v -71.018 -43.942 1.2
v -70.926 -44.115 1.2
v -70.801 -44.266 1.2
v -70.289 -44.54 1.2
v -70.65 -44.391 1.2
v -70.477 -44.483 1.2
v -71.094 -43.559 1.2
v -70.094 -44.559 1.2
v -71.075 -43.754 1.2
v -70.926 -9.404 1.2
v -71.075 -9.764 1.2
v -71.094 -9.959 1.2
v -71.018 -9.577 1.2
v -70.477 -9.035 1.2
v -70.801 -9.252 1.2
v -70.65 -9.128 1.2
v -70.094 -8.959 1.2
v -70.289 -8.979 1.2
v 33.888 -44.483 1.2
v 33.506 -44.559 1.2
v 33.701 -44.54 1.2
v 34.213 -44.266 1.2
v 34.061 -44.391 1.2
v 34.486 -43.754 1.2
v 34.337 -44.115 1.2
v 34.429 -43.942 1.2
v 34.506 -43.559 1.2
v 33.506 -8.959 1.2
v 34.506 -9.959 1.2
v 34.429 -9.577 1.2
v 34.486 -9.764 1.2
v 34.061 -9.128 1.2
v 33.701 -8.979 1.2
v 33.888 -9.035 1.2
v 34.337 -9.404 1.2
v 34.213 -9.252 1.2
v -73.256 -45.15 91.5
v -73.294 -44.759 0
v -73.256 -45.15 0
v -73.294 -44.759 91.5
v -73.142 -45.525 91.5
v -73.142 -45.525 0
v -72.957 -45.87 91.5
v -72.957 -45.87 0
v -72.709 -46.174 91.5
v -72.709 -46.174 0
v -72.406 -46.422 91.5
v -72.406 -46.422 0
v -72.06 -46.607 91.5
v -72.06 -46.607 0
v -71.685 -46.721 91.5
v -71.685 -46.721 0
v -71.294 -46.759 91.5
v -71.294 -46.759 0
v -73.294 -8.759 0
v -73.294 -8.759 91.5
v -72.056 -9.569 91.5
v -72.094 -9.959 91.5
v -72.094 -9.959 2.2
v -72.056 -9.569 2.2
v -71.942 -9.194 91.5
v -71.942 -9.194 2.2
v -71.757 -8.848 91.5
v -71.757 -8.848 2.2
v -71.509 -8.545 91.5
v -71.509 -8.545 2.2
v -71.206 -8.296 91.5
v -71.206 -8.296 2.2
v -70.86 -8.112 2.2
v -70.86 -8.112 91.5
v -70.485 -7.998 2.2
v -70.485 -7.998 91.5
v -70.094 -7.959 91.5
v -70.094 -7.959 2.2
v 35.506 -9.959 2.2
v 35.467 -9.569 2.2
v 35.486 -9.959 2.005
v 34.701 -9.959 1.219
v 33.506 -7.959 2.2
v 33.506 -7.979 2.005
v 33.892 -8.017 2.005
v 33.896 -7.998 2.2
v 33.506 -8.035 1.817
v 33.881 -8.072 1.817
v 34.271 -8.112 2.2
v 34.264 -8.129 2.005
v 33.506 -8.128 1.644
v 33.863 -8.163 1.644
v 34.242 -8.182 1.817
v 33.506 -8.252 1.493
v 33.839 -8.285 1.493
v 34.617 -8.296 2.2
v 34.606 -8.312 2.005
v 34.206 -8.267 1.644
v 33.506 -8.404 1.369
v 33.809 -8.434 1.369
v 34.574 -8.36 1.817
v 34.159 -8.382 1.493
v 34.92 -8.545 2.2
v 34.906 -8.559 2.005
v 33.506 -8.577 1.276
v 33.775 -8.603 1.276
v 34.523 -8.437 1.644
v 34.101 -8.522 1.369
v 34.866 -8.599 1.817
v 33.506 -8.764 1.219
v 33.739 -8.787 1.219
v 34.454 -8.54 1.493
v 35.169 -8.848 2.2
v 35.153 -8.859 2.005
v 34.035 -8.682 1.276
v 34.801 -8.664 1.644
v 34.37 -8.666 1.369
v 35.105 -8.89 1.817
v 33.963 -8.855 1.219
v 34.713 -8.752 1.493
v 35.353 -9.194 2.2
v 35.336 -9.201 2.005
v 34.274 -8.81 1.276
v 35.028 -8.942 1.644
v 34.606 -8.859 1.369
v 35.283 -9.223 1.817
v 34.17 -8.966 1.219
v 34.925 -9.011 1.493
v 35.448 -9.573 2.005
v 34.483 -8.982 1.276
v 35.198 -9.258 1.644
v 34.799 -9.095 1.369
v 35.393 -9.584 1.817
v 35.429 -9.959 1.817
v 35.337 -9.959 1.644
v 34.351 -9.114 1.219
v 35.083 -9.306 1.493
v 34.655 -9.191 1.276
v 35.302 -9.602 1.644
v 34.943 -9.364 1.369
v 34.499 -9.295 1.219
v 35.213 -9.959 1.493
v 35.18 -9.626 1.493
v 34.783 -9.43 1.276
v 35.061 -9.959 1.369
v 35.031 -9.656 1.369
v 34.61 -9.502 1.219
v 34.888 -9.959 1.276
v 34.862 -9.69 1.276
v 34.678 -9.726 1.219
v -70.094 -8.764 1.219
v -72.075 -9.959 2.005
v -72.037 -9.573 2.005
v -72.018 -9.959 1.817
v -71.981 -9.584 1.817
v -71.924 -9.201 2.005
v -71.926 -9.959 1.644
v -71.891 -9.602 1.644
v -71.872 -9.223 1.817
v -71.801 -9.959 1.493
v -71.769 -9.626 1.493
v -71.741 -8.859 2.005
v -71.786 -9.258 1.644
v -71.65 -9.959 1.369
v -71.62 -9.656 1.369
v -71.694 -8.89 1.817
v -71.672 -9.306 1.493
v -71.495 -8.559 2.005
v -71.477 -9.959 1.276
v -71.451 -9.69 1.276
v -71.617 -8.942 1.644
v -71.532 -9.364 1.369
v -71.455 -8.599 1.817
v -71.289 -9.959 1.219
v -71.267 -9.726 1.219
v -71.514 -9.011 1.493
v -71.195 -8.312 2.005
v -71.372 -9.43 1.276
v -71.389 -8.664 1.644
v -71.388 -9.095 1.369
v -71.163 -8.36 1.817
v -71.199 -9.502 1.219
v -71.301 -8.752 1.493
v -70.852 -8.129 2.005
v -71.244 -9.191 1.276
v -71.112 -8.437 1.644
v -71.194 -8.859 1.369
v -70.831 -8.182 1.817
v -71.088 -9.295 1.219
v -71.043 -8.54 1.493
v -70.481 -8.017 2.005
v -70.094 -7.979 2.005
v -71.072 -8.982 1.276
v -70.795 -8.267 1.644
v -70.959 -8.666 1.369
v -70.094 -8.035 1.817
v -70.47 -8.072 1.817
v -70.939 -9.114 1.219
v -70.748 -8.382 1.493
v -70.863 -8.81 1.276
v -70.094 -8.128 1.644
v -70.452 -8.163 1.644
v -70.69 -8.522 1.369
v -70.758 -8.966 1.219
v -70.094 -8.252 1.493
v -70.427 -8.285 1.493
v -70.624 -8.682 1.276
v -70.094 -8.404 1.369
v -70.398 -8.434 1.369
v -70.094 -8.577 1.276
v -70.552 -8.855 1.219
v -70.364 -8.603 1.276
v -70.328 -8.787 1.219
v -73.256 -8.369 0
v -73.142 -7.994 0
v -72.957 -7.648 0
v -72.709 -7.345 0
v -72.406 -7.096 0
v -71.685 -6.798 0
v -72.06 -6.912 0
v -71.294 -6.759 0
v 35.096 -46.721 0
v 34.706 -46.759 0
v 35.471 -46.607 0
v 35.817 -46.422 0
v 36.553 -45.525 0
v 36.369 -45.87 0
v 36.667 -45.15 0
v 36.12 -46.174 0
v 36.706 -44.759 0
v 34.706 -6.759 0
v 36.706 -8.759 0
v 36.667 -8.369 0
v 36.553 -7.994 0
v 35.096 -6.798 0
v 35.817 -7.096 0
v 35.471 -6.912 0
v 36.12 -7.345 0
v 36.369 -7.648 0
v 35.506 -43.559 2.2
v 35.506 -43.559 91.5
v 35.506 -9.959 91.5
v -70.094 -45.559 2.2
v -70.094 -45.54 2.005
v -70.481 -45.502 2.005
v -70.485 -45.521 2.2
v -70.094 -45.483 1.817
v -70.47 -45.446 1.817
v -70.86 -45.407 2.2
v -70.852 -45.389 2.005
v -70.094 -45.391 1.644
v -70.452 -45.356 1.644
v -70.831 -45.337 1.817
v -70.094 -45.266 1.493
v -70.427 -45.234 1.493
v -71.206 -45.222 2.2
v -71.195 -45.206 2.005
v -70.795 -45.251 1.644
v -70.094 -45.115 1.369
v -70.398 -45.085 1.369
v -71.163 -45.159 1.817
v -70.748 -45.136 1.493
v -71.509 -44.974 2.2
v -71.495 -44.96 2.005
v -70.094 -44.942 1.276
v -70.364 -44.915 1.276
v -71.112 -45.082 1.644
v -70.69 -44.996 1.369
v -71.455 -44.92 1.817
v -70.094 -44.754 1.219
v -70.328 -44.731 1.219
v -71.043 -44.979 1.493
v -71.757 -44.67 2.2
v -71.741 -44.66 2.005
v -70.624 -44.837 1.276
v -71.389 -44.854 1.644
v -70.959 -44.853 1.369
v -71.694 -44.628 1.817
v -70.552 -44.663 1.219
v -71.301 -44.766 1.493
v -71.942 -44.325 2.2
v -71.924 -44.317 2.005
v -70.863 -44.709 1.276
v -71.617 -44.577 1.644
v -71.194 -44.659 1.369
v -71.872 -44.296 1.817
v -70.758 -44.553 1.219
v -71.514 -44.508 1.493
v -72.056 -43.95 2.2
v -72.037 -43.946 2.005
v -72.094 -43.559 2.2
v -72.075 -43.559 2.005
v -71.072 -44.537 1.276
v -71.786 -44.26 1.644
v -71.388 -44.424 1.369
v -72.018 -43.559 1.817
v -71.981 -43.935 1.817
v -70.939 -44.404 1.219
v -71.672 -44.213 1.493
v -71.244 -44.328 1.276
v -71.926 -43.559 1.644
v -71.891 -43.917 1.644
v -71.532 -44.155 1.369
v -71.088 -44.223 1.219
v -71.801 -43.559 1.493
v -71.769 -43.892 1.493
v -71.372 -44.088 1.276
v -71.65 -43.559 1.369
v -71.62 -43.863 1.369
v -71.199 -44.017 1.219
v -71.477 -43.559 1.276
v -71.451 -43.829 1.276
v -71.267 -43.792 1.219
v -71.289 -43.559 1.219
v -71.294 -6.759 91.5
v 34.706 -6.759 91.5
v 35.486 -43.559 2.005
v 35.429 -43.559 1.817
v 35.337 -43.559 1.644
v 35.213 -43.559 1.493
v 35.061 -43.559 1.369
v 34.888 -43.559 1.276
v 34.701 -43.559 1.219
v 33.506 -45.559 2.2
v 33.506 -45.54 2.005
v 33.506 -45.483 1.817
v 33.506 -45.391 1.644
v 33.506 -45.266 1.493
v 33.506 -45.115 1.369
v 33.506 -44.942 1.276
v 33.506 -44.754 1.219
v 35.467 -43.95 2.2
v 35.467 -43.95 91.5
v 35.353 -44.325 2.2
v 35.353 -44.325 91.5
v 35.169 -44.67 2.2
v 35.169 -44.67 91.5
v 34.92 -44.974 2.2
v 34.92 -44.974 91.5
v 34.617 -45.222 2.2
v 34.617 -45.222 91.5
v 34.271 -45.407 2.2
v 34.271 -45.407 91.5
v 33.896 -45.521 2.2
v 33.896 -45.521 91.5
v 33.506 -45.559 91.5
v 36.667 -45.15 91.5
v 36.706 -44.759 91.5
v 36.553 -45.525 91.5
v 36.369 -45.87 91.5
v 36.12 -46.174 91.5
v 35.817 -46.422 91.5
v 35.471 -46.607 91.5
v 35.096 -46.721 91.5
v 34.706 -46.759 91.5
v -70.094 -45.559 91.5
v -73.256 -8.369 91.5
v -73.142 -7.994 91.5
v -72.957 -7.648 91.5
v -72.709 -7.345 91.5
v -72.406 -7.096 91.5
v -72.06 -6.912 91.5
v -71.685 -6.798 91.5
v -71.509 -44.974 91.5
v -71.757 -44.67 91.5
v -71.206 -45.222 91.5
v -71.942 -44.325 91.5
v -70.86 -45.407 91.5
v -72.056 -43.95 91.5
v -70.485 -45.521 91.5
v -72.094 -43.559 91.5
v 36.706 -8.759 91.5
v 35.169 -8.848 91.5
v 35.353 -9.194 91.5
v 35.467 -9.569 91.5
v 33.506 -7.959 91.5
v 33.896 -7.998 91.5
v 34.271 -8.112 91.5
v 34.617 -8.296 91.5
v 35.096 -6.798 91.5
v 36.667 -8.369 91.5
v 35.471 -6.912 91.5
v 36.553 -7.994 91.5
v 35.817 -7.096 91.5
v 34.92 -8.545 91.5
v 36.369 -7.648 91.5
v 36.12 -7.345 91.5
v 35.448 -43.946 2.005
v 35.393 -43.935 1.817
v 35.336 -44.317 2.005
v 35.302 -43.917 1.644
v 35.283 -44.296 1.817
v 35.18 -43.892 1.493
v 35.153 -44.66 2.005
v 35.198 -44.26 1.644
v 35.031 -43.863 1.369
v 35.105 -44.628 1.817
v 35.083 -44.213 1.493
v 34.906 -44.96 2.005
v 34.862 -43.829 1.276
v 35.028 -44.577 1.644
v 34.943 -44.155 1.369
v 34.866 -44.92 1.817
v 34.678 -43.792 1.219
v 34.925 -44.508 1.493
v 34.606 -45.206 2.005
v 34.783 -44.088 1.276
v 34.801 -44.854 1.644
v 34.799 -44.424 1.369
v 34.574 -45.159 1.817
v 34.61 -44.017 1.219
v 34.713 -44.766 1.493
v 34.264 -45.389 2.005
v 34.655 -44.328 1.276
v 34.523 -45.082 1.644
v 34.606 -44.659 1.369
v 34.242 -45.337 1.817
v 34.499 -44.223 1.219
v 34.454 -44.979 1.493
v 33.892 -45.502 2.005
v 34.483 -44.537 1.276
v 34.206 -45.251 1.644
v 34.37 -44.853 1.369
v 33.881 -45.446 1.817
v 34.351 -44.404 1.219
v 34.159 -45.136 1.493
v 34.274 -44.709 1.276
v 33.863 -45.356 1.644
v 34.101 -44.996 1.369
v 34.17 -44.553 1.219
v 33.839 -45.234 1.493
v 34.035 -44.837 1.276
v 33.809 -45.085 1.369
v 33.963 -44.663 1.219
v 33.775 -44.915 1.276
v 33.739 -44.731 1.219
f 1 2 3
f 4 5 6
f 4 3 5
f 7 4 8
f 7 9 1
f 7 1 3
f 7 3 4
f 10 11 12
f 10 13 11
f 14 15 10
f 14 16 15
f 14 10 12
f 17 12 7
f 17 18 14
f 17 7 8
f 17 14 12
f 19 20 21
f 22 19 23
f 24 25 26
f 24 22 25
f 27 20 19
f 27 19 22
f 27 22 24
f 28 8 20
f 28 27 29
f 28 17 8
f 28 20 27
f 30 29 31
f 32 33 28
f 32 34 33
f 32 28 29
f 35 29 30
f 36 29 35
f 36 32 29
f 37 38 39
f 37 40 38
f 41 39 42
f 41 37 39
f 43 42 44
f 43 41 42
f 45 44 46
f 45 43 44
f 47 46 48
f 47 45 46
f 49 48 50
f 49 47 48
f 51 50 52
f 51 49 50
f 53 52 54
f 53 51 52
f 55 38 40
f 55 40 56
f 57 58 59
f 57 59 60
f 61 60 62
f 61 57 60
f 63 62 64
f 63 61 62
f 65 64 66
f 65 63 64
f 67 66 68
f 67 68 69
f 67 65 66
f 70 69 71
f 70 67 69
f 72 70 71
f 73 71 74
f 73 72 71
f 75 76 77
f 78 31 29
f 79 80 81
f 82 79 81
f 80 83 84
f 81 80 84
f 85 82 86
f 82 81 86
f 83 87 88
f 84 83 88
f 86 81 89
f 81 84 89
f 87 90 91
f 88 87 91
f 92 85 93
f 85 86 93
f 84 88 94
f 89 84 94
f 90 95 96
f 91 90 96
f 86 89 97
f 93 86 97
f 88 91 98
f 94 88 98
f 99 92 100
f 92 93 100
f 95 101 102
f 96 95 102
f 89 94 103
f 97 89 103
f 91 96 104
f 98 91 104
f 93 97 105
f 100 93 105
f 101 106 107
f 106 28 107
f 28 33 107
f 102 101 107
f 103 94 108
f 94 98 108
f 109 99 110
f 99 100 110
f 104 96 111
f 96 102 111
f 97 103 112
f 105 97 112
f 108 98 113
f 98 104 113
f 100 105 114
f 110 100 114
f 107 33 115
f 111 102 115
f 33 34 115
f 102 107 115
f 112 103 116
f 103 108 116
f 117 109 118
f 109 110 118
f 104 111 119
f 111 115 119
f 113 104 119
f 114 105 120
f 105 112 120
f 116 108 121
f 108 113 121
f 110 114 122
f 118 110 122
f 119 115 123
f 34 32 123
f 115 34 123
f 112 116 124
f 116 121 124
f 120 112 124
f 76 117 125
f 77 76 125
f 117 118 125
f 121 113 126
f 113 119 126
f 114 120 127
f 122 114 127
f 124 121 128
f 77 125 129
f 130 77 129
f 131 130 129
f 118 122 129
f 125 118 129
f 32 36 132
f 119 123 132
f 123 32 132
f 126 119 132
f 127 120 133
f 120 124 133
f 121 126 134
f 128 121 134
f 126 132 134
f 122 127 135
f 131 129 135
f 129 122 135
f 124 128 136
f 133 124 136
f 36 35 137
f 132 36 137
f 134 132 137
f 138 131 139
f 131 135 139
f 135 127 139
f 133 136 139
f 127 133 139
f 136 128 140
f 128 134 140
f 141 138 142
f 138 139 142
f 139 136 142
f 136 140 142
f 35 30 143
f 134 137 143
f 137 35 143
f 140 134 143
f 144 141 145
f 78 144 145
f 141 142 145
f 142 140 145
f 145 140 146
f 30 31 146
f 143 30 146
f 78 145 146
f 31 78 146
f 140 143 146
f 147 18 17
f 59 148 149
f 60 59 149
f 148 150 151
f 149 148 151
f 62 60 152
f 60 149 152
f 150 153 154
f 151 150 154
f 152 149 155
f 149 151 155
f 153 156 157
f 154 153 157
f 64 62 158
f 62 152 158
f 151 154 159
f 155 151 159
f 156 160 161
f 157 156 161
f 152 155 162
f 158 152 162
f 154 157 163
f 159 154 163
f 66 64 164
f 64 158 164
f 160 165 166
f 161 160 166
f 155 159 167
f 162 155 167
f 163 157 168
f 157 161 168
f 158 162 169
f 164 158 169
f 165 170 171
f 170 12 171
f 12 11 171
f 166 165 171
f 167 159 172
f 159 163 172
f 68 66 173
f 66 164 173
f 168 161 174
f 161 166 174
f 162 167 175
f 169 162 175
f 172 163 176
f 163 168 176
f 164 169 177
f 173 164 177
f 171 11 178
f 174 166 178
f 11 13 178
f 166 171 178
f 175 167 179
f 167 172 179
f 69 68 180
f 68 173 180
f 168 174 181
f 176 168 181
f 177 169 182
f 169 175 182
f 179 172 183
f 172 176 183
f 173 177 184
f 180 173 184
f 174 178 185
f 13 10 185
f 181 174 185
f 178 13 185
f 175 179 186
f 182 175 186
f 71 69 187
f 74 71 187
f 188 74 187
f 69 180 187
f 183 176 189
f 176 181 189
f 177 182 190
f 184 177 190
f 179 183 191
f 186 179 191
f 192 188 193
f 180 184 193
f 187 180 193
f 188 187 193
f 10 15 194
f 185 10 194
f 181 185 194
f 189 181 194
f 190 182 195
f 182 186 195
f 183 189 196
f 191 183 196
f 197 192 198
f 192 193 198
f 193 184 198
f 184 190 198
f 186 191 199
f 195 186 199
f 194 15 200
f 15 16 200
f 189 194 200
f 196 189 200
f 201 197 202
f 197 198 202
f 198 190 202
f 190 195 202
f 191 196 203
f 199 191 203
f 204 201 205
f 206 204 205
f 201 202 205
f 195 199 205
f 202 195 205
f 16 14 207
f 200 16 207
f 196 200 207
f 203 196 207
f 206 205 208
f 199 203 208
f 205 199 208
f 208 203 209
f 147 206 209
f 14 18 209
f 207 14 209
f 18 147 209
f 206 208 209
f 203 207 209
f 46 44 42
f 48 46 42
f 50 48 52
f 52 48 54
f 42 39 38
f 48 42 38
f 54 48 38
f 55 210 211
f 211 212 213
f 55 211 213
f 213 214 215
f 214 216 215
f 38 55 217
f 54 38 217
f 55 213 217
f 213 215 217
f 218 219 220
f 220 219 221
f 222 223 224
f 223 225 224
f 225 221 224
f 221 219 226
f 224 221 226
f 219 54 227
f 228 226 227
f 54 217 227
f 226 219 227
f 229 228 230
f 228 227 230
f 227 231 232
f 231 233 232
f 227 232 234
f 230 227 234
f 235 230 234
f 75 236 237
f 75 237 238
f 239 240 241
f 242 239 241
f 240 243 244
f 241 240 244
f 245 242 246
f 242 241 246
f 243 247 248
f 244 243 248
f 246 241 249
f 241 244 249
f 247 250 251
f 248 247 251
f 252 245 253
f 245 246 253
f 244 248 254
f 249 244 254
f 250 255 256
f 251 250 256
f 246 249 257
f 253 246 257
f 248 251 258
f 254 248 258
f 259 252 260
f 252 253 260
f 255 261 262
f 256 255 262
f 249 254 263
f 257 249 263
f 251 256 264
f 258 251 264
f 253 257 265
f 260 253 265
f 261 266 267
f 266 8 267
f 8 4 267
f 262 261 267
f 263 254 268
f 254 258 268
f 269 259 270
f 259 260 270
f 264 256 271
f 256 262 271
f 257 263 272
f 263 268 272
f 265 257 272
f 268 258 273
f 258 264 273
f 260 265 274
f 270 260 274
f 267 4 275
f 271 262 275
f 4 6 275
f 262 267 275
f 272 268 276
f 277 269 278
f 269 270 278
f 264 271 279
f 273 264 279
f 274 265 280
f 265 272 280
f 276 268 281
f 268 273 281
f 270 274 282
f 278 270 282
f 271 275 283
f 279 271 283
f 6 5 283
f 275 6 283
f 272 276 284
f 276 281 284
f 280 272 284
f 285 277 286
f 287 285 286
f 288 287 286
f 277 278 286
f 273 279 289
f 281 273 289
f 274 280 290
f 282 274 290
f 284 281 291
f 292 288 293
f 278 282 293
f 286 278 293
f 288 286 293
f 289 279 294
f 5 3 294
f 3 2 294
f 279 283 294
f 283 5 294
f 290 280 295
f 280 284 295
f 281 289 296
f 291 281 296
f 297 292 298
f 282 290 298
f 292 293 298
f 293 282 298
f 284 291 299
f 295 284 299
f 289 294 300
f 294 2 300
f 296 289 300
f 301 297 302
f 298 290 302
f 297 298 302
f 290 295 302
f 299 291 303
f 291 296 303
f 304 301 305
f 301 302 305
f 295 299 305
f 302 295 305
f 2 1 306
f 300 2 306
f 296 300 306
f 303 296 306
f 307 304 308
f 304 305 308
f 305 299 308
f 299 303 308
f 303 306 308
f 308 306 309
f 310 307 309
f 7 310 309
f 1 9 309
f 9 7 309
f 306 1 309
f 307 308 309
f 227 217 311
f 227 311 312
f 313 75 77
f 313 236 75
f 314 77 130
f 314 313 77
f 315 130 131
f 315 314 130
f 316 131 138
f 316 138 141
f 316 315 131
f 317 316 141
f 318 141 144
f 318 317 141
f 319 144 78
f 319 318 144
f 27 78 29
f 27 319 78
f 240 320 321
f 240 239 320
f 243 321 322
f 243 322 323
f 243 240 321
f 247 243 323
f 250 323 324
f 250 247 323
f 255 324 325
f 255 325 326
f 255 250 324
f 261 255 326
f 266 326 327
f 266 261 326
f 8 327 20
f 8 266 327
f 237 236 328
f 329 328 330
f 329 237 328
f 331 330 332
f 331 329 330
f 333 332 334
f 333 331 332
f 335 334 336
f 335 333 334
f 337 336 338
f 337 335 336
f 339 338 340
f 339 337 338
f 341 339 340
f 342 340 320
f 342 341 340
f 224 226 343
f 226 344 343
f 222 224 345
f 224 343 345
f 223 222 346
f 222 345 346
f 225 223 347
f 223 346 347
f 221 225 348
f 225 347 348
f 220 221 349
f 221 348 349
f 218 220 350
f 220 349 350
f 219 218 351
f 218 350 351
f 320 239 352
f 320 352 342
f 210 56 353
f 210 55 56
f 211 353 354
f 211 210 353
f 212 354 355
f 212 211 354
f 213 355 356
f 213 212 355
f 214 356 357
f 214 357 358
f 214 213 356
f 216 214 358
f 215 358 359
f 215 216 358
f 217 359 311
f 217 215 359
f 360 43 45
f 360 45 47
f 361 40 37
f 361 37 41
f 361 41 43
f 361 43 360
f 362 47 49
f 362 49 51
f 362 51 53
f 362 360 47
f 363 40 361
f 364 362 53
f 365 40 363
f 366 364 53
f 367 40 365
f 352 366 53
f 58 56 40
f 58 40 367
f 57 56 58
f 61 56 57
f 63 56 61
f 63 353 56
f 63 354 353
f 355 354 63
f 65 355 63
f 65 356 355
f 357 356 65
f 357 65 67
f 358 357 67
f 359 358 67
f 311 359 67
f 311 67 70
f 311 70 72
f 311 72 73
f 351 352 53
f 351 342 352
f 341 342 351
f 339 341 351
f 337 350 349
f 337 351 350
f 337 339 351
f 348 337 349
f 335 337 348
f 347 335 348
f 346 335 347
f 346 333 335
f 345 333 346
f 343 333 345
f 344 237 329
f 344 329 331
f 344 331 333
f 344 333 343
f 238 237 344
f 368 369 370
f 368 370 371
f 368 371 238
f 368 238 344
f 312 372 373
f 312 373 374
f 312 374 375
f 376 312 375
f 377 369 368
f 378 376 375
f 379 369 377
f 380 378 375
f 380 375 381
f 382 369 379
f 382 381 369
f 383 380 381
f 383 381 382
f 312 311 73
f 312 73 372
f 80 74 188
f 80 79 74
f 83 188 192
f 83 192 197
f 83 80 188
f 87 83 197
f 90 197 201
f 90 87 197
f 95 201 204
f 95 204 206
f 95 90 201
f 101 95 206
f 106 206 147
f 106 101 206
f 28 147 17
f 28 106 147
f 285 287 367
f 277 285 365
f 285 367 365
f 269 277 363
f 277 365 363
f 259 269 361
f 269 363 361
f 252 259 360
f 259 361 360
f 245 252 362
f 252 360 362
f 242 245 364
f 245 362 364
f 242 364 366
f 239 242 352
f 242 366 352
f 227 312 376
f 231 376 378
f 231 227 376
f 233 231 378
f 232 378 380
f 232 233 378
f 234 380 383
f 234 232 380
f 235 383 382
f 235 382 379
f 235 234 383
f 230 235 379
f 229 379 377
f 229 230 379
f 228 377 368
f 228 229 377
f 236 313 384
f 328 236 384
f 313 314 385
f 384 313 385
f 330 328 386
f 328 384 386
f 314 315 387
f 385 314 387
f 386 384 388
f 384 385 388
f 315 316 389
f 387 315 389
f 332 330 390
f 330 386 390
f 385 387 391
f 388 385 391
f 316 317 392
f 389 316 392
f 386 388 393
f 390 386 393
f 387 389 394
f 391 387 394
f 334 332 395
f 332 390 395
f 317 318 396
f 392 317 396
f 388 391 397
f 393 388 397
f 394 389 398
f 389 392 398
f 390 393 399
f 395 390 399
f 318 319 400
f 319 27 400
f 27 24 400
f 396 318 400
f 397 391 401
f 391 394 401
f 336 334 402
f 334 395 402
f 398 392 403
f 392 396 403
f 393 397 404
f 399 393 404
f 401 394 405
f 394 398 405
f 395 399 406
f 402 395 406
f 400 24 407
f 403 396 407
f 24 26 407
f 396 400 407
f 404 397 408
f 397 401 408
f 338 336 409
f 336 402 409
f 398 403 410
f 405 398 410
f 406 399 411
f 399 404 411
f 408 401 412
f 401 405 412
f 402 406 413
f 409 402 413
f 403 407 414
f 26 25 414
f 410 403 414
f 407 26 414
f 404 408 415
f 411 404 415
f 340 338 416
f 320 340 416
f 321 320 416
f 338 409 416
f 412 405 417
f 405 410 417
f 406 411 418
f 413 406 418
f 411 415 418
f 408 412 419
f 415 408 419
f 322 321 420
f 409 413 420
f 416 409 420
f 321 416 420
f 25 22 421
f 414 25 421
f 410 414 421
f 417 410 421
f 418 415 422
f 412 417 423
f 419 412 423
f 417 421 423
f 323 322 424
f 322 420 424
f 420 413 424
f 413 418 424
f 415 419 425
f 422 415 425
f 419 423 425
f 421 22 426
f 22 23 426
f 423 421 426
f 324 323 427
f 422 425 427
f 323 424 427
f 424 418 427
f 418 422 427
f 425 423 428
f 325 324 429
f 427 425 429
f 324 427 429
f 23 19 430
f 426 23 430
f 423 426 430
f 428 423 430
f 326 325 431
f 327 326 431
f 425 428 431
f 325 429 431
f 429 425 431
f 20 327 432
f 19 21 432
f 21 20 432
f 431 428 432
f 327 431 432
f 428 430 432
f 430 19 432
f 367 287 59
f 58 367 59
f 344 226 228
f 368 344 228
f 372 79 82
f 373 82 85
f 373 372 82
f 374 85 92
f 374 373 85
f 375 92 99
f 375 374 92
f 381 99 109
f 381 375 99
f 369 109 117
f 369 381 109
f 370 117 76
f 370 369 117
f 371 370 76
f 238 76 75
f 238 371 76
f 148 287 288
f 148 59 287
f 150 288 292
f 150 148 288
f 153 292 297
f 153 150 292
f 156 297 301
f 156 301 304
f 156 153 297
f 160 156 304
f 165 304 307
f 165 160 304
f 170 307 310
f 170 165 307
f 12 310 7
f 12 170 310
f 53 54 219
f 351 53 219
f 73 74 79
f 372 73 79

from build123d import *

# Parameters (mm, degrees)
F0_W     = 110
F0_H     = 40
F0_W_2   = 107.6
F0_H_2   = 37.6
F1_DEPTH = 91.5
F2_DEPTH = 1.2
F3_R     = 2
F4_R     = 1


with BuildPart() as f1:
    # F0 (on Top) → F1 (new body)
    with BuildSketch(Plane.XY):
        with Locations((-18.294387, -26.759323)):
            Rectangle(F0_W, F0_H)
        with Locations((-18.294387, -26.759323)):
            Rectangle(F0_W_2, F0_H_2, mode=Mode.SUBTRACT)
    extrude(amount=F1_DEPTH)

    # F0 (on Top) → F2 (join)
    with BuildSketch(Plane.XY):
        with Locations((-18.294387, -26.759323)):
            Rectangle(F0_W, F0_H)
        with Locations((-18.294387, -26.759323)):
            Rectangle(F0_W_2, F0_H_2, mode=Mode.SUBTRACT)
        with Locations((-18.294387, -26.759323)):
            Rectangle(F0_W_2, F0_H_2)
    extrude(amount=F2_DEPTH)

    # F3
    f3_edges = [f1.edges().sort_by_distance(p)[0] for p in [
        (-73.294387, -46.759323, 45.75),
        (36.705613, -46.759323, 45.75),
        (36.705613, -6.759323, 45.75),
        (-73.294387, -6.759323, 45.75),
        (35.505613, -7.959323, 46.35),
        (-72.094387, -7.959323, 46.35),
        (-72.094387, -45.559323, 46.35),
        (35.505613, -45.559323, 46.35),
    ]]
    fillet(f3_edges, radius=F3_R)

    # F4
    f4_edges = [f1.edges().sort_by_distance(p)[0] for p in [
        (-72.094387, -26.759323, 1.2),
    ]]
    fillet(f4_edges, radius=F4_R)


solid = f1.part
